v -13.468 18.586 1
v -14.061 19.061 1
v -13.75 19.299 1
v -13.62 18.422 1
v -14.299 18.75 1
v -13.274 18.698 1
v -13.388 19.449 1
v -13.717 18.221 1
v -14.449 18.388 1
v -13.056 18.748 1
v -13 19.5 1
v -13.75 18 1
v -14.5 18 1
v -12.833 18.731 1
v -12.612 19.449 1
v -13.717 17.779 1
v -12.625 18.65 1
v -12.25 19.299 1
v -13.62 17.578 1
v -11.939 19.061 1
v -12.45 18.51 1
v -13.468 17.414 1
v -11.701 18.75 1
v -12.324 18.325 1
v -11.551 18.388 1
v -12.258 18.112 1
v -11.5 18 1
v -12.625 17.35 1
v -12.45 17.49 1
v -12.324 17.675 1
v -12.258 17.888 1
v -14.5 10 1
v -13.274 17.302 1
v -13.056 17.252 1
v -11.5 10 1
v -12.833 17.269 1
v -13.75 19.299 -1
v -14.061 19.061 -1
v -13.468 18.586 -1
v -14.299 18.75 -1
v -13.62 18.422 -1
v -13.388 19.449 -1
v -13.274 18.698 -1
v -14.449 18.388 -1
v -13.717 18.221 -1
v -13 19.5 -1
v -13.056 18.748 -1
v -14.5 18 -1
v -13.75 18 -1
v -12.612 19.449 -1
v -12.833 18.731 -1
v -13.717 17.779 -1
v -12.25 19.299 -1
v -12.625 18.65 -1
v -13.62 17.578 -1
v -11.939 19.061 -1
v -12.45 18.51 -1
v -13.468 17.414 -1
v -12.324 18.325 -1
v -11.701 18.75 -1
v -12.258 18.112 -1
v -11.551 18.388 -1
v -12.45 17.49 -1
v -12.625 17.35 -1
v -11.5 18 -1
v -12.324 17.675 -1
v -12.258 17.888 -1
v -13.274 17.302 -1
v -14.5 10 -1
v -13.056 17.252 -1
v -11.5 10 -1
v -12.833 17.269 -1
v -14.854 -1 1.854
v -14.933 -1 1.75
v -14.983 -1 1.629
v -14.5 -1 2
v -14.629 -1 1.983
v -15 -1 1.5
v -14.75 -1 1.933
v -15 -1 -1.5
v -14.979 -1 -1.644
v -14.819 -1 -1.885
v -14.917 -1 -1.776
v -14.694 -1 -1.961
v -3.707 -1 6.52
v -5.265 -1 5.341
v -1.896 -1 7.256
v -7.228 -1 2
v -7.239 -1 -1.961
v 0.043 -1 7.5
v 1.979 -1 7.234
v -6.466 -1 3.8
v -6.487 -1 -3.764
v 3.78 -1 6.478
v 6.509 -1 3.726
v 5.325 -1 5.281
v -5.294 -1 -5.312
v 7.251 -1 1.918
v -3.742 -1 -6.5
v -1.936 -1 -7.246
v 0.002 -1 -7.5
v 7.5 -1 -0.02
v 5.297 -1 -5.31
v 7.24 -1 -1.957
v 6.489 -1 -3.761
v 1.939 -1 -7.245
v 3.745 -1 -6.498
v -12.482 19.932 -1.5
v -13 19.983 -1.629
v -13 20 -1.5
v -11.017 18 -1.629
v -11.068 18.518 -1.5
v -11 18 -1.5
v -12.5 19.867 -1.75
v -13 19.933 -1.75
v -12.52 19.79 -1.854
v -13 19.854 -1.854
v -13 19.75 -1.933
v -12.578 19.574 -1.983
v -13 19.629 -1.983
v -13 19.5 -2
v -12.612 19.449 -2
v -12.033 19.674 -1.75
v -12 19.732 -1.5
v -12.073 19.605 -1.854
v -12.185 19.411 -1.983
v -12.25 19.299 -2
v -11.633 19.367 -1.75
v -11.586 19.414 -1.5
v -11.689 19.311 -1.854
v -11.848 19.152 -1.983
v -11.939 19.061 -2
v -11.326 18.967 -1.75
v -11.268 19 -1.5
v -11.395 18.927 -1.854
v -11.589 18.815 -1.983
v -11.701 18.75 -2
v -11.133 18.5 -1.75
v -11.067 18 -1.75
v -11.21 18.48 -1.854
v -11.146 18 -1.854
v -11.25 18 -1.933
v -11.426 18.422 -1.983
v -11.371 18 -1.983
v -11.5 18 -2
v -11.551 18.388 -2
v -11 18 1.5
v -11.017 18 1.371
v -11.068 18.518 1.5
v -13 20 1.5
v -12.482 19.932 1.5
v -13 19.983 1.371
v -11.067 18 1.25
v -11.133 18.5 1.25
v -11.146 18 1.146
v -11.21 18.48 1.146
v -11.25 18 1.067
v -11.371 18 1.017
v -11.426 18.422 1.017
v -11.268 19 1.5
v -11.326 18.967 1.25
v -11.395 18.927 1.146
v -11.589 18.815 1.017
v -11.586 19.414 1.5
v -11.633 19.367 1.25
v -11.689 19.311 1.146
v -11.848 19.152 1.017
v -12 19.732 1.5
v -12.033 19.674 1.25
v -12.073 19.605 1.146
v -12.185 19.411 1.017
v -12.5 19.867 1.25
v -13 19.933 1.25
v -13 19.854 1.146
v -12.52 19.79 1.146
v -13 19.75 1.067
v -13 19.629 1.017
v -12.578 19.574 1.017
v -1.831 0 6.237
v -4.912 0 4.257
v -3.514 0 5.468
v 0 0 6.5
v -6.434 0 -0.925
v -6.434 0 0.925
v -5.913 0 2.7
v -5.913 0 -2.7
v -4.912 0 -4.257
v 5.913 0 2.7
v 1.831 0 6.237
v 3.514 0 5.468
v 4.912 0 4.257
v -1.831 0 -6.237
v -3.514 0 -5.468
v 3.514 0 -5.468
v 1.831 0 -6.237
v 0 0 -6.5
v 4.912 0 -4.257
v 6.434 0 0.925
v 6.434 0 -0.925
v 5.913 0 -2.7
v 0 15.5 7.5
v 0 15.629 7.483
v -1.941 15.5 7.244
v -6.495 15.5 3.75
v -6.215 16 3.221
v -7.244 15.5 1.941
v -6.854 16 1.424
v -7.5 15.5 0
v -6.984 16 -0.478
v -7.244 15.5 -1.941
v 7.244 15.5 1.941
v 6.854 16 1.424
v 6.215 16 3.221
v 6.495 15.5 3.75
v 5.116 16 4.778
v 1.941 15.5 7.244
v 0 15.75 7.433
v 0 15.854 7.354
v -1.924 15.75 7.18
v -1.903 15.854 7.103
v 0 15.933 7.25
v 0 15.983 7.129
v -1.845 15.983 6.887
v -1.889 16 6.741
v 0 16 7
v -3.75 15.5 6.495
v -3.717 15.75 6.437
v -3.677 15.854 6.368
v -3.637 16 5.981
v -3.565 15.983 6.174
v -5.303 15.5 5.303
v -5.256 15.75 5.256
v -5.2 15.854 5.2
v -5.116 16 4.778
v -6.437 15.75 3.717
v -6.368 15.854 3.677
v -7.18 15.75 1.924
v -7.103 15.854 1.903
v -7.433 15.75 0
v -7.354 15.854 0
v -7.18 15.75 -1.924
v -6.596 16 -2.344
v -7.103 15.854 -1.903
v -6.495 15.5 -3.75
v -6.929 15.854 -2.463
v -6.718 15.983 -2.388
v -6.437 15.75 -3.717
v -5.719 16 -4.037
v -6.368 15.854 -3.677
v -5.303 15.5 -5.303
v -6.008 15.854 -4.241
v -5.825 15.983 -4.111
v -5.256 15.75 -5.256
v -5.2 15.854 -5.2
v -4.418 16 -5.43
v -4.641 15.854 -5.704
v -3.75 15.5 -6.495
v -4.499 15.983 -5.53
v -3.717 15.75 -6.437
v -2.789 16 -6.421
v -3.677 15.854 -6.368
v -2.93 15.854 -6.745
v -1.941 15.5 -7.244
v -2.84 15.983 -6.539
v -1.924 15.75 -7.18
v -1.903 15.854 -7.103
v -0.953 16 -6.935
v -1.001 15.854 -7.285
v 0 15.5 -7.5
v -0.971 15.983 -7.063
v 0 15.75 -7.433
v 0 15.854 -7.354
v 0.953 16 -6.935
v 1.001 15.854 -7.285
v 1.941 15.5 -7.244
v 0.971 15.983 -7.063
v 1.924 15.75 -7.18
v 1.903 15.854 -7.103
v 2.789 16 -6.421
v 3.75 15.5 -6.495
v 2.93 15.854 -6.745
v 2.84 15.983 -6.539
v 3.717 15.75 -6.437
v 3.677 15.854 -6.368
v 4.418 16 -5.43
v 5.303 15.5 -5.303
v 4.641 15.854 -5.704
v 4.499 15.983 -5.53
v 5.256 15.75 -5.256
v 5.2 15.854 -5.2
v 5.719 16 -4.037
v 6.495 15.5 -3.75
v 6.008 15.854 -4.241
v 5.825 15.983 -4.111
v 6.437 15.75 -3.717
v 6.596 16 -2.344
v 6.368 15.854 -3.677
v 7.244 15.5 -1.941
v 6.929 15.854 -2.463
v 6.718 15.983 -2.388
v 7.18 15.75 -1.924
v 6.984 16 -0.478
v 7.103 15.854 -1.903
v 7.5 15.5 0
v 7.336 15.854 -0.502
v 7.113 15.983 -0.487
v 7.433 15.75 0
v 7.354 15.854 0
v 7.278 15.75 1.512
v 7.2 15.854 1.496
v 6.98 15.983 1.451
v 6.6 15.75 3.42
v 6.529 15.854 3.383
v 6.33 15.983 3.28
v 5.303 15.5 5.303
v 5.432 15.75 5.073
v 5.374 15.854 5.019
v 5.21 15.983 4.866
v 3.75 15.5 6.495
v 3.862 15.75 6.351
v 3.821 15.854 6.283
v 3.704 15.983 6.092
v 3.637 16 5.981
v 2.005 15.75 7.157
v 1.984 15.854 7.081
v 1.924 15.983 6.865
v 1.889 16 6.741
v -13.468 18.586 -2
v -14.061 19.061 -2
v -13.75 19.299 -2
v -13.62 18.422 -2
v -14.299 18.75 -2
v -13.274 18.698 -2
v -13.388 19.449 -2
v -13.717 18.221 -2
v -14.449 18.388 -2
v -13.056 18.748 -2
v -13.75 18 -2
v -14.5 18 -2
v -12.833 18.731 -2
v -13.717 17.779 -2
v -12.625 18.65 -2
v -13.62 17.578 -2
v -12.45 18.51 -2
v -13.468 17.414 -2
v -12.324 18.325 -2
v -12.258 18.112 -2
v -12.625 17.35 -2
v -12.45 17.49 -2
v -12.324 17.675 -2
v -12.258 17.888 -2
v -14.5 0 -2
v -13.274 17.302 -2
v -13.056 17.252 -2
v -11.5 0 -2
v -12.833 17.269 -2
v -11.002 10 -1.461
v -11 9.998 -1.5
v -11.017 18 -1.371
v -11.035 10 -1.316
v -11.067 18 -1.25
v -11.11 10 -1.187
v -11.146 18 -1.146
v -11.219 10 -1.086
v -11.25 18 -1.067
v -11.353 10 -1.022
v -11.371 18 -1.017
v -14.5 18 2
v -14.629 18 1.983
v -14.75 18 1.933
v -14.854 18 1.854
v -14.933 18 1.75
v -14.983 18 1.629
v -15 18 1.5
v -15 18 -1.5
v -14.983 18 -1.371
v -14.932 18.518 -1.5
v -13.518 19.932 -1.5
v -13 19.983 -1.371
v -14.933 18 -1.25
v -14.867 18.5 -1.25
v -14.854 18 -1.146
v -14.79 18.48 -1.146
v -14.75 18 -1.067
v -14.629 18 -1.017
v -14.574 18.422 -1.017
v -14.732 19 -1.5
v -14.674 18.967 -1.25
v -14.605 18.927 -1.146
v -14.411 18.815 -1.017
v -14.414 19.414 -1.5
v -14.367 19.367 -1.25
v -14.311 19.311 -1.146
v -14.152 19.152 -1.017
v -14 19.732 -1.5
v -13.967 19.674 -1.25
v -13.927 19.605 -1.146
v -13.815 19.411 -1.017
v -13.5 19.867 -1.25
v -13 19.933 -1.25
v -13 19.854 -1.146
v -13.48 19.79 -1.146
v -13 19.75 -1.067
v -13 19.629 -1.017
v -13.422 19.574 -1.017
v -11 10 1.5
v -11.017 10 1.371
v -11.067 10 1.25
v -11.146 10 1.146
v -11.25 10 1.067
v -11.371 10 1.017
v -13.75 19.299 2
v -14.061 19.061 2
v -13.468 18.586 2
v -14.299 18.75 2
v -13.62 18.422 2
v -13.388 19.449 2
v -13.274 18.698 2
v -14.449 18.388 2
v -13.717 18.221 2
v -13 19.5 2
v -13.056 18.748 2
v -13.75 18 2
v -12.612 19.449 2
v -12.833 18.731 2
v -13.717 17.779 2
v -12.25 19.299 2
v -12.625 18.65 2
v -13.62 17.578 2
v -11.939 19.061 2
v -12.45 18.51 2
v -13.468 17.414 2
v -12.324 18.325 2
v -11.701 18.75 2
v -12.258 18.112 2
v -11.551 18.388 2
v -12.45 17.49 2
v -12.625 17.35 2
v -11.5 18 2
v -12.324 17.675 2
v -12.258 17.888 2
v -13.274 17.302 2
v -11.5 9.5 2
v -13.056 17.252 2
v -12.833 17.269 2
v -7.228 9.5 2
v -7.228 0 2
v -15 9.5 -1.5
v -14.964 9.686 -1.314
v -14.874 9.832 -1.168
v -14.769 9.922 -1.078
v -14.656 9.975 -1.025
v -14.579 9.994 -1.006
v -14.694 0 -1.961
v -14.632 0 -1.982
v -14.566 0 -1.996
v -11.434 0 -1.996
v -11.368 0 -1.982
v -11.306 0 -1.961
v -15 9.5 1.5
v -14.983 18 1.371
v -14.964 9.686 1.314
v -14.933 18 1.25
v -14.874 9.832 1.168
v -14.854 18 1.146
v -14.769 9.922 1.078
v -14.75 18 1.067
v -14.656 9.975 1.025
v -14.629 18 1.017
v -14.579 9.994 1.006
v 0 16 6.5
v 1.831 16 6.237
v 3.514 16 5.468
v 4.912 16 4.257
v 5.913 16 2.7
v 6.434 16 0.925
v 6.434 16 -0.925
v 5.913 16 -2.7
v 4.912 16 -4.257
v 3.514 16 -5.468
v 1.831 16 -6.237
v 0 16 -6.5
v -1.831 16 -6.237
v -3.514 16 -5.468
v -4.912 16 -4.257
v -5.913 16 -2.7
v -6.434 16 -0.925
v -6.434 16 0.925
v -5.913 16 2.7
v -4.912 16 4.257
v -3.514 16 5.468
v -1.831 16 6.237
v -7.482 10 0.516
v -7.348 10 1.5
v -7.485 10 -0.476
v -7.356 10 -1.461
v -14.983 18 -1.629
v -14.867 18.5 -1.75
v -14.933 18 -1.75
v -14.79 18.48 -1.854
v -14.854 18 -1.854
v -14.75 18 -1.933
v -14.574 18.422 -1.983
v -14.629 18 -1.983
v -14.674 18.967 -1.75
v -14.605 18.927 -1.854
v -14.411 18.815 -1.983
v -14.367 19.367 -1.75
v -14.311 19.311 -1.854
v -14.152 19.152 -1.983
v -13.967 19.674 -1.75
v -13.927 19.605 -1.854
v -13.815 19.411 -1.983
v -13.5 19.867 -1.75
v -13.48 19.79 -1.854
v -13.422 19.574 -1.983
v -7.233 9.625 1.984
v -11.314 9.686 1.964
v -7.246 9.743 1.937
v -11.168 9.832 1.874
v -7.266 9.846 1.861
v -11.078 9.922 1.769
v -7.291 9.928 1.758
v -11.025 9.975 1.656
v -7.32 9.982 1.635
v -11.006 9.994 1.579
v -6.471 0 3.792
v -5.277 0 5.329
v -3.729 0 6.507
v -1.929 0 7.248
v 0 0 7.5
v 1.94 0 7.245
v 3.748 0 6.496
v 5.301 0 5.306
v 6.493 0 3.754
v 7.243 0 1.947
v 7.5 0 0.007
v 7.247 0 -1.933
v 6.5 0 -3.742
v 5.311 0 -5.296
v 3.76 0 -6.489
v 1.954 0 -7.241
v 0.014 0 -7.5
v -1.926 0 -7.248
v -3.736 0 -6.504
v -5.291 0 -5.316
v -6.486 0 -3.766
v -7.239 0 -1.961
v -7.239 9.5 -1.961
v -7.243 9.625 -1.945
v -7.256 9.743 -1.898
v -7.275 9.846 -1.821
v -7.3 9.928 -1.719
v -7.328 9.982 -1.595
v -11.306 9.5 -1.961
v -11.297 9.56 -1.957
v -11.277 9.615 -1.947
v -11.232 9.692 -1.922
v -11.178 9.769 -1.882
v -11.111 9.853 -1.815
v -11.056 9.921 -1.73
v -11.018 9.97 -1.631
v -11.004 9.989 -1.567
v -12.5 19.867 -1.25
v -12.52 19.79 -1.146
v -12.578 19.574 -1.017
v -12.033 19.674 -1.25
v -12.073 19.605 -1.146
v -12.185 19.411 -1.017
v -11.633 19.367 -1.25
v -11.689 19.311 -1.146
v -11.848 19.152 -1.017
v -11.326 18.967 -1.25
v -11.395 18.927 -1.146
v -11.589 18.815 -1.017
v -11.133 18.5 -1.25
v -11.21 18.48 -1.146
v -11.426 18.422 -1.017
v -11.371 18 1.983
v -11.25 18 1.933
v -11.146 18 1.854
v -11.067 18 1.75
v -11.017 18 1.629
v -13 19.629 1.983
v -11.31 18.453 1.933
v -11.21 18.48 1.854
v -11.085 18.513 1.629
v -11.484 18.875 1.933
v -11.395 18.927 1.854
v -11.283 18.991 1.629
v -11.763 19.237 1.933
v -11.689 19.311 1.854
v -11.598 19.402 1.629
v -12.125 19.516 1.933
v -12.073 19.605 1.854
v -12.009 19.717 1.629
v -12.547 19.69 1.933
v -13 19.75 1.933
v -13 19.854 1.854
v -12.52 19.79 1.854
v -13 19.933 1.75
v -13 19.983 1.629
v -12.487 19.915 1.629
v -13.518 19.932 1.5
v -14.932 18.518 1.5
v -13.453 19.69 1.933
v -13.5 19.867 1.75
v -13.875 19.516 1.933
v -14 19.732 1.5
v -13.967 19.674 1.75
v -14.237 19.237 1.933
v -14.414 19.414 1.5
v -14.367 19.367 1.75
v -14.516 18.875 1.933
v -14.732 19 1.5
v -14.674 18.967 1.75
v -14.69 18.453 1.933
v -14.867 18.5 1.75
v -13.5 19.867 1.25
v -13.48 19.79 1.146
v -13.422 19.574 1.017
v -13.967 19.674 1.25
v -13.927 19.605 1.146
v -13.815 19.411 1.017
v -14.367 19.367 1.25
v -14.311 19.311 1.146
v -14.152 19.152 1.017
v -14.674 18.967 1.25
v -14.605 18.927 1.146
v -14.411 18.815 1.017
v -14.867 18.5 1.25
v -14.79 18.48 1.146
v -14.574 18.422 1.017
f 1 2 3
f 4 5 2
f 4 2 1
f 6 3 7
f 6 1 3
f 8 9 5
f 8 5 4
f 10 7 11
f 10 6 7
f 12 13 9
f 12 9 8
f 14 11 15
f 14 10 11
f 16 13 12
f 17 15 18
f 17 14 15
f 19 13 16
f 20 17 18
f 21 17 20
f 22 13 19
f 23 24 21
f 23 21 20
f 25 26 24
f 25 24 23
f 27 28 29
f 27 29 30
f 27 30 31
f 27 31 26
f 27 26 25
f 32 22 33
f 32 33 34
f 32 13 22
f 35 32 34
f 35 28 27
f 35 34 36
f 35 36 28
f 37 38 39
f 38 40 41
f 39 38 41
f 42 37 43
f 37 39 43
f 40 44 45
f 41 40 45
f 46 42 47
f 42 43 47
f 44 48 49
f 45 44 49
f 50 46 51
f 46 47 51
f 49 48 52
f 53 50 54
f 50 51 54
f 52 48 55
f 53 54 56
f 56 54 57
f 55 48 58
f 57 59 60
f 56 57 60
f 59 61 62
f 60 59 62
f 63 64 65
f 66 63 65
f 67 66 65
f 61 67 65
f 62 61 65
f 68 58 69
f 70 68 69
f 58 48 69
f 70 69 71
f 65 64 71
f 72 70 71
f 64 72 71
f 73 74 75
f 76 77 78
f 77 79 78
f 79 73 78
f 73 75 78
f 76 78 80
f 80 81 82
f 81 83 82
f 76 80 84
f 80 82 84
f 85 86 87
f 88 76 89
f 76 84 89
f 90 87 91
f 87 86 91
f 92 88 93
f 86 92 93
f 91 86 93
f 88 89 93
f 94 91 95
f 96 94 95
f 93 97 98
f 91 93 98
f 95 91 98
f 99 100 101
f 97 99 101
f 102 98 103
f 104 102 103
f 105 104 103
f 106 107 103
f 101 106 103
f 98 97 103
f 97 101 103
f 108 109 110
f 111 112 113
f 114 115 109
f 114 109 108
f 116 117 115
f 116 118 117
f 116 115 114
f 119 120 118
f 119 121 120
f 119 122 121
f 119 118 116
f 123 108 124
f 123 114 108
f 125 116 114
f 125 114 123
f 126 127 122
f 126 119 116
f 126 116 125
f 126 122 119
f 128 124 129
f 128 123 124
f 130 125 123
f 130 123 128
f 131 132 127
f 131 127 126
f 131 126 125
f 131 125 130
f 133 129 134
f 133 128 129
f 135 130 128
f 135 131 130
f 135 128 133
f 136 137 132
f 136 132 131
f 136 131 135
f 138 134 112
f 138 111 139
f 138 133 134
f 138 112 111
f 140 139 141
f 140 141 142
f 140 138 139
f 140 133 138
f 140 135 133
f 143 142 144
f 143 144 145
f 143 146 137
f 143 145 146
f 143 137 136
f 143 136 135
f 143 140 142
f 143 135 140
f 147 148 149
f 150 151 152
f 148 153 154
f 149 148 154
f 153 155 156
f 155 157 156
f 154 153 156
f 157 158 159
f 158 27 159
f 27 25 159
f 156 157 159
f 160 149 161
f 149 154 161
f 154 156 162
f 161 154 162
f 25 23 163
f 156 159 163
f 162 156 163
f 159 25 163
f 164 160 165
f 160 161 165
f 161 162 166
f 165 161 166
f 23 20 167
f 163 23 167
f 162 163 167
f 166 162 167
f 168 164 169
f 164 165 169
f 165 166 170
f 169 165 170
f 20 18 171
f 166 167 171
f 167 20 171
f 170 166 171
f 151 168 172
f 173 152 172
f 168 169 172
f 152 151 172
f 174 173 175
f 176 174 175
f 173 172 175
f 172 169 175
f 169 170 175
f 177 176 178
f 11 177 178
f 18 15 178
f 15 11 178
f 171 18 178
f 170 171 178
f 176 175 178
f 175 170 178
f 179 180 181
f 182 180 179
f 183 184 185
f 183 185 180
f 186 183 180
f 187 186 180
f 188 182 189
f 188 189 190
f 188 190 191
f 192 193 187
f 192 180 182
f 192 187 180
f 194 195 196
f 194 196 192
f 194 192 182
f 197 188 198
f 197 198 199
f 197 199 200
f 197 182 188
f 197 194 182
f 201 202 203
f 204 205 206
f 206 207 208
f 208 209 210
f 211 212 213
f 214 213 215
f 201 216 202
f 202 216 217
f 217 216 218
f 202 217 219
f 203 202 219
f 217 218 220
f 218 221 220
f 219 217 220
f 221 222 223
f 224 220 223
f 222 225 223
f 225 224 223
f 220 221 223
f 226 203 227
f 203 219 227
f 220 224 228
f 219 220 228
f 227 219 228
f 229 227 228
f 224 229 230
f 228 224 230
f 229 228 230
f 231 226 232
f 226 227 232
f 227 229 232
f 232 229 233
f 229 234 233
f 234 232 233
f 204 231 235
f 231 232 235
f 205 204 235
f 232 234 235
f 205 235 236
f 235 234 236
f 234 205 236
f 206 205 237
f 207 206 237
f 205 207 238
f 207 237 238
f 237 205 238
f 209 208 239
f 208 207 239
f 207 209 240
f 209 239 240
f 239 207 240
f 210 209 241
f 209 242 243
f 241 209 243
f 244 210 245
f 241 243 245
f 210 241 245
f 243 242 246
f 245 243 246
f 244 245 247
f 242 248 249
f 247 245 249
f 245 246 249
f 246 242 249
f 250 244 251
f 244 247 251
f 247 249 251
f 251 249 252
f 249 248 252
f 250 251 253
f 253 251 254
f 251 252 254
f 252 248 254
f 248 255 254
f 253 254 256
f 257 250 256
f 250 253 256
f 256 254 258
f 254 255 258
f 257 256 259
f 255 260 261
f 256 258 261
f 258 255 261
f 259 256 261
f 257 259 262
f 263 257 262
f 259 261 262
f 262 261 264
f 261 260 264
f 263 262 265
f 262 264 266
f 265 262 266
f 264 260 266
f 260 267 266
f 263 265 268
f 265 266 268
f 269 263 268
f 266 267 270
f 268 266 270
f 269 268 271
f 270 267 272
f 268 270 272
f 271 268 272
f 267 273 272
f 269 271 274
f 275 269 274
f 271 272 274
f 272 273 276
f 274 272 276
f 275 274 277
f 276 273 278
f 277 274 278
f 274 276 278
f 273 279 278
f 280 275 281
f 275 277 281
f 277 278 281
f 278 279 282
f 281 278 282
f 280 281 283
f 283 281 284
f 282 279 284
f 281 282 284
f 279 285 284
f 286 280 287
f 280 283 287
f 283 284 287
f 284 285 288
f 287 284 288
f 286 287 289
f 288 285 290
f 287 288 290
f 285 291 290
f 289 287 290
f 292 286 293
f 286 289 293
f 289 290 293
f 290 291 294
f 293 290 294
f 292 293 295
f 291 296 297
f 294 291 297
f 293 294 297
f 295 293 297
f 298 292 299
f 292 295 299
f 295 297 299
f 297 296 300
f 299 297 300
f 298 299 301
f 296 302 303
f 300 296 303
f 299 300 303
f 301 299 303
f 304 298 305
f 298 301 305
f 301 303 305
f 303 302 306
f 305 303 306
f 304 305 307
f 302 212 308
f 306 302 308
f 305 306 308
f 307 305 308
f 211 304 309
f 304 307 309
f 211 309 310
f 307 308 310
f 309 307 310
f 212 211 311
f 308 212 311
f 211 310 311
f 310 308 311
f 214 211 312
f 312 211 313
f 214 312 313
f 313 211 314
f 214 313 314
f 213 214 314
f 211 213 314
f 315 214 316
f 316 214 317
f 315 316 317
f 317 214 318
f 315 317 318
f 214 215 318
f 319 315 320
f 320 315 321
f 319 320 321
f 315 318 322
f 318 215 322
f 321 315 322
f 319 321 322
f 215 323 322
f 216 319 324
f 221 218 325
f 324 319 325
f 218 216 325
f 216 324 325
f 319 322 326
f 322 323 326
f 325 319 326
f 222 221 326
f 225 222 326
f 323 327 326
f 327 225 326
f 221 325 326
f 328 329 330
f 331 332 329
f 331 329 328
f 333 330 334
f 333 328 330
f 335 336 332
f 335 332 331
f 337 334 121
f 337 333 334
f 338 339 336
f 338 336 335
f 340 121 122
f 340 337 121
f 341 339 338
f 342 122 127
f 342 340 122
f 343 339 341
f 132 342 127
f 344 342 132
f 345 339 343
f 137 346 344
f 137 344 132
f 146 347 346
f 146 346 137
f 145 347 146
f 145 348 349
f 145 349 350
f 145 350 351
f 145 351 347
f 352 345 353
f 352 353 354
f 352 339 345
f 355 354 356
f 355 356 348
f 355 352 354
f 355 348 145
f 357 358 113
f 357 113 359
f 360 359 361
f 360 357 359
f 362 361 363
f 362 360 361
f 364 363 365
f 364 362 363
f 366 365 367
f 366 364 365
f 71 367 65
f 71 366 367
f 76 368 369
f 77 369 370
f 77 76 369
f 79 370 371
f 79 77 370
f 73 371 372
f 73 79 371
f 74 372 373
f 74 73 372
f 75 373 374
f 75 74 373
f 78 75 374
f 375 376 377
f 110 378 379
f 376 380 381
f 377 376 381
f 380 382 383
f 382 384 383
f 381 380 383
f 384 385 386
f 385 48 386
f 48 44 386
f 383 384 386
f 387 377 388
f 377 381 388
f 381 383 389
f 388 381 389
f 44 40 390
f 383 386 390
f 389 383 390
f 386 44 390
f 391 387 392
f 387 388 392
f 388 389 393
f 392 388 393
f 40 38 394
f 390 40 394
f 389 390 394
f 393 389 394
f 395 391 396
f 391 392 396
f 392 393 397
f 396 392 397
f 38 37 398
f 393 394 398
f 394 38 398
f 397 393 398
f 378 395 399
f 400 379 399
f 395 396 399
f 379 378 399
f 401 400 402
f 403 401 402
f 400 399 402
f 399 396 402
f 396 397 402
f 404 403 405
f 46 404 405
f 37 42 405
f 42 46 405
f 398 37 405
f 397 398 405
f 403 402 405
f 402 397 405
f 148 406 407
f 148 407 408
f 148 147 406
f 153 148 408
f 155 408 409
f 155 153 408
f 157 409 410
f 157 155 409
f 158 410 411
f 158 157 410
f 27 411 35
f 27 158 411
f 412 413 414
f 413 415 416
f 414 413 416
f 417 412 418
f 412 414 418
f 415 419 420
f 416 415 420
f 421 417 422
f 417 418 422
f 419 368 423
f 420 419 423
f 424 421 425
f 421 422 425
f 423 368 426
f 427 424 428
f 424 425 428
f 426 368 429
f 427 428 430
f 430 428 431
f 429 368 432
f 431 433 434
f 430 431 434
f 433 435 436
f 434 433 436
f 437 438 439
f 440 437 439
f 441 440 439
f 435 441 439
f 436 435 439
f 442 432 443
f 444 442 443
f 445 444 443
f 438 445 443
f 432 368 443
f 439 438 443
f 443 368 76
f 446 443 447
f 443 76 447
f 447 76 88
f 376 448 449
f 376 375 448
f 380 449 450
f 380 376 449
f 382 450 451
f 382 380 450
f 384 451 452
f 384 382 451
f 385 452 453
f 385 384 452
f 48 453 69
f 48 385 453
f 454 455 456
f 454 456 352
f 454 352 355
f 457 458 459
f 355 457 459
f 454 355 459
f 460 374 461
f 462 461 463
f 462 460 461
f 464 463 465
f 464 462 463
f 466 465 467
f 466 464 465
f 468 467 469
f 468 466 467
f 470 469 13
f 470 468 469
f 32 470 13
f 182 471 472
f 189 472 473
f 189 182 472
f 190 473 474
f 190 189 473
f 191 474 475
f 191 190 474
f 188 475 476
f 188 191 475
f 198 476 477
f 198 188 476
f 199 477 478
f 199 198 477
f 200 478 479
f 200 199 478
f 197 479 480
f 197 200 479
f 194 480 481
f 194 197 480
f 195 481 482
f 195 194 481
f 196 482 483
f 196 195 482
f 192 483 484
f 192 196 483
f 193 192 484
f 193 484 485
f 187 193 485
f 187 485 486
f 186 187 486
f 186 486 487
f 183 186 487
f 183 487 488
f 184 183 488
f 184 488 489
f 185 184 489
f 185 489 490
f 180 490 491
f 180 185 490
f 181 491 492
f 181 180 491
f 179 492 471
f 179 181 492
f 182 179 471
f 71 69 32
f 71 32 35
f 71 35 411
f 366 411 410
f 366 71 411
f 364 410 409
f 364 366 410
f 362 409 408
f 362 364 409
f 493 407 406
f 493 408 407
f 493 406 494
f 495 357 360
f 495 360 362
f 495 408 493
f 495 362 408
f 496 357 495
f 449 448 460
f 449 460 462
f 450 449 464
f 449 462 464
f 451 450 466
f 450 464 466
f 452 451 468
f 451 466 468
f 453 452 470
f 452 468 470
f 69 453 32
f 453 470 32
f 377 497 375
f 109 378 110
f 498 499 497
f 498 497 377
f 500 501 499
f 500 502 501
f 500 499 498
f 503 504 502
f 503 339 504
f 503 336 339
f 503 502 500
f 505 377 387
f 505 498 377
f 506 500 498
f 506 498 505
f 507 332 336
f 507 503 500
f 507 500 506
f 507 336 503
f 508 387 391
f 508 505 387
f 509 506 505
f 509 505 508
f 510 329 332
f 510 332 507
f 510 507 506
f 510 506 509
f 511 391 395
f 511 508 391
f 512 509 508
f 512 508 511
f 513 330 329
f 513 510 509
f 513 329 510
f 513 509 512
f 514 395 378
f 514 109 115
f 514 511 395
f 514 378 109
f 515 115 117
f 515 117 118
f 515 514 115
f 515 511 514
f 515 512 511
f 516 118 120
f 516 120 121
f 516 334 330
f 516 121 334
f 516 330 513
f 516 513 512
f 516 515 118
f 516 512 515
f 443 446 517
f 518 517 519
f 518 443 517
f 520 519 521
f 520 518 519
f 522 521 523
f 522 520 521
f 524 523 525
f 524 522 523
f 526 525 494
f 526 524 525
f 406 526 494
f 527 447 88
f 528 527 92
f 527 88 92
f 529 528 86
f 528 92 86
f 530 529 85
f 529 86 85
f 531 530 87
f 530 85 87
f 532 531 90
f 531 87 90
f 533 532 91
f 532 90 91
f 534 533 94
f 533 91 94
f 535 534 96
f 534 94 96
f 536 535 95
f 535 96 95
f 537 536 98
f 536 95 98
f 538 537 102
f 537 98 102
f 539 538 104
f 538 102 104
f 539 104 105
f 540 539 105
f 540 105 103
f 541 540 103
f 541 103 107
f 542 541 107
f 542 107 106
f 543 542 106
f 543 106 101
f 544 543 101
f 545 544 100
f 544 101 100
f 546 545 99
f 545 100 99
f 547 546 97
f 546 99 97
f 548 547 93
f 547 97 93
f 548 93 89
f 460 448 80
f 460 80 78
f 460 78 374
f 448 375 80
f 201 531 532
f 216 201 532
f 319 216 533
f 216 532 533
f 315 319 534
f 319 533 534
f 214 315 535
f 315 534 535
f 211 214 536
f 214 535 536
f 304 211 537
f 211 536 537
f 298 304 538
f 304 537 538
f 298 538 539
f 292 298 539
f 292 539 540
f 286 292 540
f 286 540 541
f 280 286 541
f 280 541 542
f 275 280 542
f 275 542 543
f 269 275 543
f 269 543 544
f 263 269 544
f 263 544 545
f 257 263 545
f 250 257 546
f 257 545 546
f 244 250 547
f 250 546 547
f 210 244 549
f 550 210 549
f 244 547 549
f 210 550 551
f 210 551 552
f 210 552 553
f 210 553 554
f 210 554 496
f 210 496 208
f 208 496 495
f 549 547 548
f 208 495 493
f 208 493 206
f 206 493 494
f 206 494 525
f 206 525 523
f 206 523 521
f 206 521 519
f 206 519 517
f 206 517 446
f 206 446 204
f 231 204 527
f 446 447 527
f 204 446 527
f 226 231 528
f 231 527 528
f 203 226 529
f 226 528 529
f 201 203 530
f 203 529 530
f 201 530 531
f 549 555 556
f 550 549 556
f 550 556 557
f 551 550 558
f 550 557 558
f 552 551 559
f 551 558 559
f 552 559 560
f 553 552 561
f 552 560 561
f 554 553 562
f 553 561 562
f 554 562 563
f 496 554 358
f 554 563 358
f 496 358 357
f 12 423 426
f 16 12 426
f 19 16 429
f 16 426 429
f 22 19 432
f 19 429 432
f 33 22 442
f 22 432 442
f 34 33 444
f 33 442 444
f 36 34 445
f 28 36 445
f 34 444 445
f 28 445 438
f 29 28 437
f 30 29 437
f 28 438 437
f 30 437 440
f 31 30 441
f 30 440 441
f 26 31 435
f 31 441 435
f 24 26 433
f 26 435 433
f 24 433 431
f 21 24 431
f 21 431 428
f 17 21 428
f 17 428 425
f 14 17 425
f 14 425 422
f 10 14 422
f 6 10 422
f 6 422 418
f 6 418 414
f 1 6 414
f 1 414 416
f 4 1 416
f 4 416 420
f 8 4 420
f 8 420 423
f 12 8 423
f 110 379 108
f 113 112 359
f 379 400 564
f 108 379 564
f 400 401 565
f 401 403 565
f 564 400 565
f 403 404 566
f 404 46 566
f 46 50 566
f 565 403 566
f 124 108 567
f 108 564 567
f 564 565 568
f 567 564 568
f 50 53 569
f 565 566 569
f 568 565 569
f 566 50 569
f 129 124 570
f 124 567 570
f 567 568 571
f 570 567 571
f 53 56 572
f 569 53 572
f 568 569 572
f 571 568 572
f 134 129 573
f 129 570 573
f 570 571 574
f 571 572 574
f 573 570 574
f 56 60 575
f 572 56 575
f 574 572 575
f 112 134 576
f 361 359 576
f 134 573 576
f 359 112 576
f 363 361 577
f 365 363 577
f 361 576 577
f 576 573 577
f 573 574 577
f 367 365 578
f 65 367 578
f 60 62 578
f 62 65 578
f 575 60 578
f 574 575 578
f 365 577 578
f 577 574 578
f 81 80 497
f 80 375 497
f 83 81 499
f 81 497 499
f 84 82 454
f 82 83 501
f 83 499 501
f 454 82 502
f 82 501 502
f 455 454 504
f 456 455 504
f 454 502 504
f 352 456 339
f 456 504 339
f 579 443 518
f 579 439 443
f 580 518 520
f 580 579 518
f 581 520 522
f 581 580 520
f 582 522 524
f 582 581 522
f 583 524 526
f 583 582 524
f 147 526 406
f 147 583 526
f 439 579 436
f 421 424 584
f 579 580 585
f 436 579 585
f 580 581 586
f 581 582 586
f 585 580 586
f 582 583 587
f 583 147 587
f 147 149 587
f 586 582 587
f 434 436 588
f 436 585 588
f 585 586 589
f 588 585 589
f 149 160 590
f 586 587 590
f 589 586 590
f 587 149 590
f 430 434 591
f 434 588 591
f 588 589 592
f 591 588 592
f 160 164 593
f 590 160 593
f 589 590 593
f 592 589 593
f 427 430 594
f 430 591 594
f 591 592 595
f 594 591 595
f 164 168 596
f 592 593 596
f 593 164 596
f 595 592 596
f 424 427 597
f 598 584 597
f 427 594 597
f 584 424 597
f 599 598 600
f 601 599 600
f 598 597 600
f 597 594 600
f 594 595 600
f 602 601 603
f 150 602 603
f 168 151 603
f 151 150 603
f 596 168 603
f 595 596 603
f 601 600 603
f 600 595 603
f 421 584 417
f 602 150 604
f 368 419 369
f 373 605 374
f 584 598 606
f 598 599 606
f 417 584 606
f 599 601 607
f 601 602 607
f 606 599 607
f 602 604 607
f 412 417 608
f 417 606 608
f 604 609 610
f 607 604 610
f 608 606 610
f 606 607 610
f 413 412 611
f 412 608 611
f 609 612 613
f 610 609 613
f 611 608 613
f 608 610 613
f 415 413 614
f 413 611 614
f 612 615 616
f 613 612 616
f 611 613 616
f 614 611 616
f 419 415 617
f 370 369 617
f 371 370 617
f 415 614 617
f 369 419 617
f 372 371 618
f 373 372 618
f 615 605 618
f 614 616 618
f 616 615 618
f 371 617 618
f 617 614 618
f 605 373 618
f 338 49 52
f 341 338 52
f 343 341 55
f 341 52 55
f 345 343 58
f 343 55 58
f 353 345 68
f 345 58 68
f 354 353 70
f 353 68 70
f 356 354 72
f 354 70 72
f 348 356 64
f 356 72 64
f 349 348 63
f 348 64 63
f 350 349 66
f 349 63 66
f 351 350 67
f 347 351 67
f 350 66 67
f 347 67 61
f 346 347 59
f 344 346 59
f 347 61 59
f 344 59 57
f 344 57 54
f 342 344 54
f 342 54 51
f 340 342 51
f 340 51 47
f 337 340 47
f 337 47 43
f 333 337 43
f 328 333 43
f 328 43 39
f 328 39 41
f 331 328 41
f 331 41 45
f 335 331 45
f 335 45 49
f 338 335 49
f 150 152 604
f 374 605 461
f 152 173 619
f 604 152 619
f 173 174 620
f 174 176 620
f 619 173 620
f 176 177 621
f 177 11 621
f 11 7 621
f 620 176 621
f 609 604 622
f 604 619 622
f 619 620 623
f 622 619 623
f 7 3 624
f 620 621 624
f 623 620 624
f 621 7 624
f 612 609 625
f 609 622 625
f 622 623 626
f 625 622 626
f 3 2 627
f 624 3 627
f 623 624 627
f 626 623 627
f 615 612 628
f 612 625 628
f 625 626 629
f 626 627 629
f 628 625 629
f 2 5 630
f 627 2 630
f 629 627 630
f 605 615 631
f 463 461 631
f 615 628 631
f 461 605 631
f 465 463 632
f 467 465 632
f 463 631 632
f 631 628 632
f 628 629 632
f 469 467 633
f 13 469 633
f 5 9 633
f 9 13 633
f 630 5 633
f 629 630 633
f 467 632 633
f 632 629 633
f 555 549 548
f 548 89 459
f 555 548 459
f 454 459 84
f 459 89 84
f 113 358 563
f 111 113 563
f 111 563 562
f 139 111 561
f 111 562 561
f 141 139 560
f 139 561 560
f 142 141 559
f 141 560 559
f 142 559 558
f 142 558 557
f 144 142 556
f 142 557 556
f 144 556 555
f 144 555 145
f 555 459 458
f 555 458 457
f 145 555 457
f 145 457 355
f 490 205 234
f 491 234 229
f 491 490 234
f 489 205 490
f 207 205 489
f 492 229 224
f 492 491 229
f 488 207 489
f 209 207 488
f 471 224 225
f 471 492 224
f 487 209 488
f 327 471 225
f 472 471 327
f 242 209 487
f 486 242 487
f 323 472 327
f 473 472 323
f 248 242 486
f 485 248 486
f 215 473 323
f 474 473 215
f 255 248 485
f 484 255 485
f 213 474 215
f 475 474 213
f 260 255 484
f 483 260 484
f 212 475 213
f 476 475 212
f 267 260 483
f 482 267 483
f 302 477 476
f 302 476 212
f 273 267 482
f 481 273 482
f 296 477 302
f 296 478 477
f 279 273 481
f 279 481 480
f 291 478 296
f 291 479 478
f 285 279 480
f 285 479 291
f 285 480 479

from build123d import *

# Parameters (mm, degrees)
SKETCH1_R                = 7.5
SKETCH1_R_2              = 6.5
BOSS_EXTRUDE2_DEPTH      = 20
SKETCH1_W                = 4
SKETCH1_H                = 1
BOSS_EXTRUDE2_2_DEPTH    = 20
BOSS_EXTRUDE2_3_DEPTH    = 20
BOSS_EXTRUDE3_START      = 1
BOSS_EXTRUDE3_DEPTH      = 1
SKETCH5_W                = 4
SKETCH5_H                = 2
BOSS_EXTRUDE4_DEPTH      = 10
CUT_EXTRUDE5_START       = 16
CUT_EXTRUDE5_OUTLINE_R   = 7.5
CUT_EXTRUDE5_OUTLINE_R_2 = 6.5
CUT_EXTRUDE5_DEPTH       = 4
CUT_EXTRUDE6_DEPTH       = 20
FILLET1_R                = 0.5
FILLET2_R                = 0.5


# Read off the part's stored shape, not the designer's step: Cut-Extrude5
with BuildPart() as part:
    # Sketch1 → Boss-Extrude2 (new body)
    with BuildSketch(Plane(origin=(0, 0, 0), x_dir=(1, 0, 0), z_dir=(0, 1, 0))):
        with Locations(Location((0, 0, 0), (0, 0, 270))):
            Circle(SKETCH1_R)
        with Locations(Location((0, 0, 0), (0, 0, 270))):
            Circle(SKETCH1_R_2, mode=Mode.SUBTRACT)
    extrude(amount=BOSS_EXTRUDE2_DEPTH)



with BuildPart() as body_2:
    # Sketch1 → Boss-Extrude2 2 (new body)
    with BuildSketch(Plane(origin=(0, 0, 0), x_dir=(1, 0, 0), z_dir=(0, 1, 0))):
        with Locations((-13, 1.5)):
            Rectangle(SKETCH1_W, SKETCH1_H)
    extrude(amount=BOSS_EXTRUDE2_2_DEPTH)


with BuildPart() as body_3:
    # Sketch1 → Boss-Extrude2 3 (new body)
    with BuildSketch(Plane(origin=(0, 0, 0), x_dir=(1, 0, 0), z_dir=(0, 1, 0))):
        with Locations((-13, -1.5)):
            Rectangle(SKETCH1_W, SKETCH1_H)
    extrude(amount=BOSS_EXTRUDE2_3_DEPTH)


with BuildPart() as part_1:
    add(part.part)

    add(body_2.part)  # Boss-Extrude3 merges body 2

    add(body_3.part)  # Boss-Extrude3 merges body 3
    # Sketch3 → Boss-Extrude3 (add)
    with BuildSketch(Plane(origin=(0, 0, 0), x_dir=(-1, 0, 0), z_dir=(0, -1, 0)).offset(BOSS_EXTRUDE3_START)):
        with BuildLine():
            Line((15, -2), (7.228416147, -2))
            ThreePointArc((7.228416147, -2), (-7.499972324, 0.020374901), (7.239176027, 1.96069642))
            Line((7.239176027, 1.96069642), (15, 1.96069642))
            Line((15, 1.96069642), (15, -2))
        make_face()
    extrude(amount=-BOSS_EXTRUDE3_DEPTH)

    # Sketch5 → Boss-Extrude4 (add)
    with BuildSketch(Plane(origin=(0, 0, 0), x_dir=(1, 0, 0), z_dir=(0, 1, 0))):
        with BuildLine():
            Line((-11, 1), (-11, -1))
            Line((-11, -1), (-11, -2))
            Line((-11, -2), (-7.228416147, -2))
            ThreePointArc((-7.228416147, -2), (-7.499972324, -0.020374901), (-7.239176027, 1.96069642))
            Line((-7.239176027, 1.96069642), (-11, 1.96069642))
            Line((-11, 1.96069642), (-11, 1))
        make_face()
        with Locations((-13, 0)):
            Rectangle(SKETCH5_W, SKETCH5_H)
    extrude(amount=BOSS_EXTRUDE4_DEPTH)


with BuildPart() as boss_extrude4_kept_piece:
    # of the separate pieces the step leaves, the one the design keeps (boss_extrude4_pieces_kept)
    add(part_1.part.solids().sort_by_distance((0, 0, 7.5))[0])

    # Cut-Extrude5 outline → Cut-Extrude5 (cut)
    with BuildSketch(Plane(origin=(0, 0, 0), x_dir=(1, 0, 0), z_dir=(0, 1, 0)).offset(CUT_EXTRUDE5_START)):
        Circle(CUT_EXTRUDE5_OUTLINE_R)
        Circle(CUT_EXTRUDE5_OUTLINE_R_2, mode=Mode.SUBTRACT)
    extrude(amount=CUT_EXTRUDE5_DEPTH, mode=Mode.SUBTRACT)

    # Sketch7 → Cut-Extrude6 (cut)
    with BuildSketch(Plane.XY.offset(2)):
        with BuildLine():
            ThreePointArc((-12.25, 18), (-13, 18.75), (-13.75, 18))
            Line((-13.75, 18), (-12.25, 18))
        make_face()
        with BuildLine():
            Line((-12.25, 18), (-13.75, 18))
            ThreePointArc((-13.75, 18), (-13, 17.25), (-12.25, 18))
        make_face()
        with BuildLine():
            Line((-11, 20), (-13, 20))
            ThreePointArc((-13, 20), (-11.585786438, 19.414213562), (-11, 18))
            Line((-11, 18), (-11, 20))
        make_face()
        with BuildLine():
            Line((-13, 20), (-15, 20))
            Line((-15, 20), (-15, 18))
            ThreePointArc((-15, 18), (-14.414213562, 19.414213562), (-13, 20))
        make_face()
    extrude(amount=-CUT_EXTRUDE6_DEPTH, mode=Mode.SUBTRACT)

    # Fillet1
    fillet1_edges = [boss_extrude4_kept_piece.edges().sort_by_distance(p)[0] for p in [
        (-15, 9, -2),
        (-11, 9, -2),
        (-15, 14, -1),
        (-11, 14, -1),
        (-11, 14, 1),
        (-15, 14, 1),
        (-11, 14, 2),
        (-15, 8.5, 2),
        (0, 16, -7.5),
        (-13, 20, -2),
        (-13, 20, -1),
        (-13, 20, 1),
        (-13, 20, 2),
    ]]
    fillet(fillet1_edges, radius=FILLET1_R - 0.0001)  # a hair under: the kernel refuses the full size

    # Fillet2
    fillet2_edges = [boss_extrude4_kept_piece.edges().sort_by_distance(p)[0] for p in [
        (-9.272389998, 10, -1.96069642),
        (-15, 10, 0),
        (-9.364158074, 10, 2),
    ]]
    fillet(fillet2_edges, radius=FILLET2_R - 0.0001)  # a hair under: the kernel refuses the full size


solid = boss_extrude4_kept_piece.part
